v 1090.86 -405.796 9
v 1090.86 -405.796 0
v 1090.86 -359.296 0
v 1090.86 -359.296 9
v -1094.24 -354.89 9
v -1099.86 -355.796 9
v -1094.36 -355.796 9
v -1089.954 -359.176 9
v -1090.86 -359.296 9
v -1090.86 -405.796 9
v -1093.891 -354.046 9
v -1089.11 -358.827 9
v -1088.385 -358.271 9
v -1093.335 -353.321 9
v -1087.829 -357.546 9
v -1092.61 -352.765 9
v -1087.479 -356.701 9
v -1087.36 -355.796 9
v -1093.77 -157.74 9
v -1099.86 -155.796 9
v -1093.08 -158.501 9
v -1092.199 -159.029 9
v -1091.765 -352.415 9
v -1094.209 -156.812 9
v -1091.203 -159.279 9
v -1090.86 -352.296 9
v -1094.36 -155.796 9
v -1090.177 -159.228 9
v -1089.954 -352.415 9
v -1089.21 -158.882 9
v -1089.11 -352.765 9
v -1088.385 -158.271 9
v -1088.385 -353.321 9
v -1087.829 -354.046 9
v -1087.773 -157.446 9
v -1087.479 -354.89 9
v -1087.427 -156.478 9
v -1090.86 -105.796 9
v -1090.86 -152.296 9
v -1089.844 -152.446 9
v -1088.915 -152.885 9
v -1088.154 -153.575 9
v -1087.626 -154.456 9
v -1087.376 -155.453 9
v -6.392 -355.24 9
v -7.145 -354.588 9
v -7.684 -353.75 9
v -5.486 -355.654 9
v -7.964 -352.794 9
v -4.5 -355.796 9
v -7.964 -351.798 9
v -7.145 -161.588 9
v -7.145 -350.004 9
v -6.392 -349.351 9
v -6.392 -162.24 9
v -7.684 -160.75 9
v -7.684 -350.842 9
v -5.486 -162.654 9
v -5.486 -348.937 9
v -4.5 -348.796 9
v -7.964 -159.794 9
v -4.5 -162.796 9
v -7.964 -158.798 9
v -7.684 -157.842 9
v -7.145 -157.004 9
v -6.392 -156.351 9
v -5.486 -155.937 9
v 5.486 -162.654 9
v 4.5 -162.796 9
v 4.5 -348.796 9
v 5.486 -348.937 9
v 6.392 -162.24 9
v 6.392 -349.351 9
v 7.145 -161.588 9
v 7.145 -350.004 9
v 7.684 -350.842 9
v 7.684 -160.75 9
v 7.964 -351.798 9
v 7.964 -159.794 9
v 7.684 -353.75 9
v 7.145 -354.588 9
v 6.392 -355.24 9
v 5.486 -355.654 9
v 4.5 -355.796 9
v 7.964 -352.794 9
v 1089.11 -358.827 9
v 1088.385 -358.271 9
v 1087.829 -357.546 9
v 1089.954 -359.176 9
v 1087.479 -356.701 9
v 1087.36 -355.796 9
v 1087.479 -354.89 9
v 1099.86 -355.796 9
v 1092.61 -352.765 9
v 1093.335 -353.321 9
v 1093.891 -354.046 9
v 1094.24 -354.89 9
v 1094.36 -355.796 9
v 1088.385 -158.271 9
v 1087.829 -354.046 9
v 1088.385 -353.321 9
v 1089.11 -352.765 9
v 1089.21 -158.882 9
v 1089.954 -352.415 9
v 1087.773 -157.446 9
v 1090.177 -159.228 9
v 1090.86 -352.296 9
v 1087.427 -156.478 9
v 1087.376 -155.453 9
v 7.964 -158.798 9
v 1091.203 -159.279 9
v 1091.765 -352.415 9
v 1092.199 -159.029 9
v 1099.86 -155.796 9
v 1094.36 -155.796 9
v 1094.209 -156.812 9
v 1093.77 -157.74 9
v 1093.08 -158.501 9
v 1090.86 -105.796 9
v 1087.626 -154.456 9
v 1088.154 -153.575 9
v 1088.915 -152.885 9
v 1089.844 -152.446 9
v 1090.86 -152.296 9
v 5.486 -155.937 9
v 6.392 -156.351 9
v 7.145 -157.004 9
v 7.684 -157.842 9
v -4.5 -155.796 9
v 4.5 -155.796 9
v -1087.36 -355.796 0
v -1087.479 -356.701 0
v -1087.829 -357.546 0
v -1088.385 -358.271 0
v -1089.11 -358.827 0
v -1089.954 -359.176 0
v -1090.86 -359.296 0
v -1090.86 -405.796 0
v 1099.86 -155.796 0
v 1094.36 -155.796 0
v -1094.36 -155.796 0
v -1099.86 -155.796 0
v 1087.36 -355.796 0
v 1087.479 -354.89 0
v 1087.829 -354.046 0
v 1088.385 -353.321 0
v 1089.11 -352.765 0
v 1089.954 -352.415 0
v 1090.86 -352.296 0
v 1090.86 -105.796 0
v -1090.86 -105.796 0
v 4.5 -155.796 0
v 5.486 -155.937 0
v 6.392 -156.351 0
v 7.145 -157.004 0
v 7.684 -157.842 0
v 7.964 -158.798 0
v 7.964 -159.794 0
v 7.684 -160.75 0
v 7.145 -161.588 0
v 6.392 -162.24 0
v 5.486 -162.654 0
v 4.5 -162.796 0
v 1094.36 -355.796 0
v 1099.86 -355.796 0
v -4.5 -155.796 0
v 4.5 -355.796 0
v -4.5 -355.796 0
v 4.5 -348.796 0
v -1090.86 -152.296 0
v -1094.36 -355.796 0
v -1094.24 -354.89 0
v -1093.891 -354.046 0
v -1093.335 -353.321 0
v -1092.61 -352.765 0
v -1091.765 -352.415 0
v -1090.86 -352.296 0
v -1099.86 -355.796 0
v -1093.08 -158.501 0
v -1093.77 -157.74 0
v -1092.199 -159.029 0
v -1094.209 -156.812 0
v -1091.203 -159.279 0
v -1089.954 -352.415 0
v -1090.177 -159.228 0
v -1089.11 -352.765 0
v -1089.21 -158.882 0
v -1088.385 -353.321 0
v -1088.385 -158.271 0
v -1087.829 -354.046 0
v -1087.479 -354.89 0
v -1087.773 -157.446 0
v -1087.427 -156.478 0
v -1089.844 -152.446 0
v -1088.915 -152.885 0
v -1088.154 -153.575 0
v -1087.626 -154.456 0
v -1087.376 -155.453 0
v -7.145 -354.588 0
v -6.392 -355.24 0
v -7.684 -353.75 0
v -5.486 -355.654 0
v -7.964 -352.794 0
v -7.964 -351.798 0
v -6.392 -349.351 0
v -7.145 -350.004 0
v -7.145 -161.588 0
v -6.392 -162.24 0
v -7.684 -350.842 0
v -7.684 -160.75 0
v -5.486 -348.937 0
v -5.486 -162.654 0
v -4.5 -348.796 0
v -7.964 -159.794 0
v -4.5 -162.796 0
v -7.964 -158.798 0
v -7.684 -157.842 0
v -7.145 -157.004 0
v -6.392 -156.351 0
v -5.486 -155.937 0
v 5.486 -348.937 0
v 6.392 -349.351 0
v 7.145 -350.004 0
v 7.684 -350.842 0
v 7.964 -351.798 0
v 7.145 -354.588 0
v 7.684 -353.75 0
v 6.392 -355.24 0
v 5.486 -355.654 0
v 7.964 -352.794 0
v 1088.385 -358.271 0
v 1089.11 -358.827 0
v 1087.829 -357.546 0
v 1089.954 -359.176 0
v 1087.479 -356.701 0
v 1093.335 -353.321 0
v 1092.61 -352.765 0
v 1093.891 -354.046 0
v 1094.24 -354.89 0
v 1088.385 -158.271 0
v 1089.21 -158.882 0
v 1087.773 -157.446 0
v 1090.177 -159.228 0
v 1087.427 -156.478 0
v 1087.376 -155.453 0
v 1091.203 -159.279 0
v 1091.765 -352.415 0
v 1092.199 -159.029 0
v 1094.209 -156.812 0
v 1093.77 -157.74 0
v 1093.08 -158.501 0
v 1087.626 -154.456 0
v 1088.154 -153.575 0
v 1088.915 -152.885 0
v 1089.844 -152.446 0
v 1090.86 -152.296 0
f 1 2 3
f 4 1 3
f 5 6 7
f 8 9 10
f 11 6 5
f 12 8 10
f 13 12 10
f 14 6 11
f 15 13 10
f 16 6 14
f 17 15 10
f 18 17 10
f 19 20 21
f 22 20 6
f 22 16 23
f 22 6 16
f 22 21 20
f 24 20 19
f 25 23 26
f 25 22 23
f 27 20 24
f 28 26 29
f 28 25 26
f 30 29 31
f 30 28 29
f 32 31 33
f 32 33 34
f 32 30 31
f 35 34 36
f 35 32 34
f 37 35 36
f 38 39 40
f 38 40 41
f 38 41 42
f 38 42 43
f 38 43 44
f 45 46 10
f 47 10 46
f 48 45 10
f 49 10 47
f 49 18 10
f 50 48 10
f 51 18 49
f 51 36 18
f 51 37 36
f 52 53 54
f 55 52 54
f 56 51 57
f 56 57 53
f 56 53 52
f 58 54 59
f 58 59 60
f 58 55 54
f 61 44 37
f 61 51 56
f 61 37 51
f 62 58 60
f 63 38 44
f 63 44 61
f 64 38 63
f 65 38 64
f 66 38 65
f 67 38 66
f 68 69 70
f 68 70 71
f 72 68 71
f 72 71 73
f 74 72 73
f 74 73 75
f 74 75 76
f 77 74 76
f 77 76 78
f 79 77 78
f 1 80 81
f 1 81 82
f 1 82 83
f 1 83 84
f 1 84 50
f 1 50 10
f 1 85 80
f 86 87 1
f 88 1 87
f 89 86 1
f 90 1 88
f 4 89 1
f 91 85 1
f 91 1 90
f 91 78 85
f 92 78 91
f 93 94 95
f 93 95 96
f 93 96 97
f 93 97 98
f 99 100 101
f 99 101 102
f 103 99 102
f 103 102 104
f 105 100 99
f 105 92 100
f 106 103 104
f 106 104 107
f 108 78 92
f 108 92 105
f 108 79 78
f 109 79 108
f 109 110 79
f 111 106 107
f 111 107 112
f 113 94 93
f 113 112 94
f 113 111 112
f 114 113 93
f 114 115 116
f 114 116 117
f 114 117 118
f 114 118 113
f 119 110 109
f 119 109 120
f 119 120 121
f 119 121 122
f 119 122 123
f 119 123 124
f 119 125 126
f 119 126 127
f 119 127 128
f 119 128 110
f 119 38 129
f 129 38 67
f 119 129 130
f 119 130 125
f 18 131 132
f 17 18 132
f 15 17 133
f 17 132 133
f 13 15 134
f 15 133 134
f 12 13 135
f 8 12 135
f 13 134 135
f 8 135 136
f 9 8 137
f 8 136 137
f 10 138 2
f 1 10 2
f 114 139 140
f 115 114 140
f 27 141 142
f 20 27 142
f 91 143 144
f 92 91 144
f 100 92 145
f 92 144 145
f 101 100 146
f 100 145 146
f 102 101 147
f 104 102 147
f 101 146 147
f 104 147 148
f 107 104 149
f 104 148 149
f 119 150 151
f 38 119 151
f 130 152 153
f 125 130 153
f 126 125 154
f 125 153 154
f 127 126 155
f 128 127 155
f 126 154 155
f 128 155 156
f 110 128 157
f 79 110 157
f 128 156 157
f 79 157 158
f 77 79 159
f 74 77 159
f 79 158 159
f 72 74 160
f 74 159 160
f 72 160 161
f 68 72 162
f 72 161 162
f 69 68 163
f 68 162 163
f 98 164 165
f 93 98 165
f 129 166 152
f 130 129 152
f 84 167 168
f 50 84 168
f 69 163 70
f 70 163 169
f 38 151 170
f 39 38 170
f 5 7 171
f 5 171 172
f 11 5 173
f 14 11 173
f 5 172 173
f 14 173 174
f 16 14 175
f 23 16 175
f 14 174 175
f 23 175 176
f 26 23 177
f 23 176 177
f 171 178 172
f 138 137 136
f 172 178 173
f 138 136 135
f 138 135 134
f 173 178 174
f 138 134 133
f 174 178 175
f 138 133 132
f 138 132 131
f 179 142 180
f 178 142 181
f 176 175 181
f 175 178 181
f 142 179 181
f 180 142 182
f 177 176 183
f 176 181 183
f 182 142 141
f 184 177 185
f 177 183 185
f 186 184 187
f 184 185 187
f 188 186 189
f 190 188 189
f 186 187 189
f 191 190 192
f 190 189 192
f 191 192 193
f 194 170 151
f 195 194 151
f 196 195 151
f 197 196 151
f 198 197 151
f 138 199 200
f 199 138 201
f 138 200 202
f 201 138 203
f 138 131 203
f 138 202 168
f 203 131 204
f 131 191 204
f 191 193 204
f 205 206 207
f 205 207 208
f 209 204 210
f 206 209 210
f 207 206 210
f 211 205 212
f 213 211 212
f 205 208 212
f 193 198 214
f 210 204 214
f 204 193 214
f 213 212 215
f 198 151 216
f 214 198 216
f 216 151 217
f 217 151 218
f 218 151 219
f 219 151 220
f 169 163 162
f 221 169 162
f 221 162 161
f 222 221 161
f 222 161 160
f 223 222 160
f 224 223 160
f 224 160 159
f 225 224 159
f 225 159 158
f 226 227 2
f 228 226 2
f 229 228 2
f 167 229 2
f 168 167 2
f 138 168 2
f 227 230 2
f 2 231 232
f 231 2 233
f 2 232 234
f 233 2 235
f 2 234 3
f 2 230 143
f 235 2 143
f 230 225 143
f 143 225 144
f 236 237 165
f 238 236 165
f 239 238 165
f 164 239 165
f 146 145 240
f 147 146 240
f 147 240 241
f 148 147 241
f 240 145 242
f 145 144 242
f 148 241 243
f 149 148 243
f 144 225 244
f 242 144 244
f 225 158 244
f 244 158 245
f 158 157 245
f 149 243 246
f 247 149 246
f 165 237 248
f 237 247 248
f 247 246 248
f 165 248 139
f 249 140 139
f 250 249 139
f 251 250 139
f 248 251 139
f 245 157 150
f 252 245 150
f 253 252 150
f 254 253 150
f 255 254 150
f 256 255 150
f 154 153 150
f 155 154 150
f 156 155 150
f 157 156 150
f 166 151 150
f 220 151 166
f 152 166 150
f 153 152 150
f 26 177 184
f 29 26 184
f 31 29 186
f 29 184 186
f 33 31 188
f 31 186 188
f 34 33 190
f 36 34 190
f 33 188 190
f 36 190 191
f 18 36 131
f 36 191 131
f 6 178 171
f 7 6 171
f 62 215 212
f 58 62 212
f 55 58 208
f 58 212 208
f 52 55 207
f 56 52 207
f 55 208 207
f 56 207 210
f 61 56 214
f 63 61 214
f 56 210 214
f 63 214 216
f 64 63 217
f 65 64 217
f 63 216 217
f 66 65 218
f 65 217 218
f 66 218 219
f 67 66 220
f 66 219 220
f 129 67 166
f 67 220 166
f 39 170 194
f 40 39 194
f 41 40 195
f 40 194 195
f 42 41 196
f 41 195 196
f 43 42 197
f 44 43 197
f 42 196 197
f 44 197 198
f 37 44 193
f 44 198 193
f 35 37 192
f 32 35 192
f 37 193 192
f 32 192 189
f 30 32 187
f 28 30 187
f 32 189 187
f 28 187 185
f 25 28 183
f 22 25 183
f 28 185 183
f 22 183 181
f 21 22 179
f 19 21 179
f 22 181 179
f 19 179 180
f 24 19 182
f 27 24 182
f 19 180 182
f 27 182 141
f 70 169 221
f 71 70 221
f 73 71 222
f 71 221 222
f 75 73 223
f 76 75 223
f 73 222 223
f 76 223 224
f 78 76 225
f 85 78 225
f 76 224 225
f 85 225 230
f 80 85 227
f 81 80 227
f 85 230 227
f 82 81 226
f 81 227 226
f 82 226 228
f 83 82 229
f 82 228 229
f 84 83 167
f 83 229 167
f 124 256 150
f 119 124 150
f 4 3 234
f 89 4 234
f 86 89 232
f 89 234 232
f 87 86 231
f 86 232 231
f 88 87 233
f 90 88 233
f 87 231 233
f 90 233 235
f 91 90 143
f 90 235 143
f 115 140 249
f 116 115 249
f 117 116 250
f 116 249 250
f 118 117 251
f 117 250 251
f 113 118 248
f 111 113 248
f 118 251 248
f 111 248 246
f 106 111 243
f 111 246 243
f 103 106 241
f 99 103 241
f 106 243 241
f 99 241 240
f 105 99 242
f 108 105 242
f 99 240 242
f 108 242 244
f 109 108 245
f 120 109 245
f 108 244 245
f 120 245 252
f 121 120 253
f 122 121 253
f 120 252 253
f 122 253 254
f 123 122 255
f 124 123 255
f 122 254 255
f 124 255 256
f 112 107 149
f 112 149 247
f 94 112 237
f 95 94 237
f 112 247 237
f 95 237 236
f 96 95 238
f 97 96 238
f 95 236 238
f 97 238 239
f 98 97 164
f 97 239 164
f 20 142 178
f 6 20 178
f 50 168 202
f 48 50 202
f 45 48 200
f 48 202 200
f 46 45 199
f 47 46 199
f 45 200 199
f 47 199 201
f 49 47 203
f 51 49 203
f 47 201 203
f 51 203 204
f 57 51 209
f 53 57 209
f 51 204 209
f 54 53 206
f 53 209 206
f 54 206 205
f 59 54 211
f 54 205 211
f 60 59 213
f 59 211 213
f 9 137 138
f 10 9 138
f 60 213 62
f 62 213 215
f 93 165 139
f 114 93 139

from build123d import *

# Parameters (mm, degrees)
F1_DEPTH = 9


with BuildPart() as f1:
    # F0 (on Top) → F1 (new body)
    with BuildSketch(Plane.XY):
        with BuildLine():
            Line((1090.859627, -105.795628), (-1090.859627, -105.795628))
            Line((-1090.859627, -105.795628), (-1090.859627, -152.295628))
            ThreePointArc((-1090.859627, -152.295628), (-1088.384754, -158.270502), (-1094.359627, -155.795628))
            Line((-1094.359627, -155.795628), (-1099.859627, -155.795628))
            Line((-1099.859627, -155.795628), (-1099.859627, -355.795628))
            Line((-1099.859627, -355.795628), (-1094.359627, -355.795628))
            ThreePointArc((-1094.359627, -355.795628), (-1093.334501, -353.320754), (-1090.859627, -352.295628))
            ThreePointArc((-1090.859627, -352.295628), (-1088.384754, -353.320754), (-1087.359627, -355.795628))
            ThreePointArc((-1087.359627, -355.795628), (-1088.384754, -358.270502), (-1090.859627, -359.295628))
            Line((-1090.859627, -359.295628), (-1090.859627, -405.795628))
            Line((-1090.859627, -405.795628), (1090.859627, -405.795628))
            Line((1090.859627, -405.795628), (1090.859627, -359.295628))
            ThreePointArc((1090.859627, -359.295628), (1088.384754, -358.270502), (1087.359627, -355.795628))
            ThreePointArc((1087.359627, -355.795628), (1088.384754, -353.320754), (1090.859627, -352.295628))
            ThreePointArc((1090.859627, -352.295628), (1093.334501, -353.320754), (1094.359627, -355.795628))
            Line((1094.359627, -355.795628), (1099.859627, -355.795628))
            Line((1099.859627, -355.795628), (1099.859627, -155.795628))
            Line((1099.859627, -155.795628), (1094.359627, -155.795628))
            ThreePointArc((1094.359627, -155.795628), (1088.384754, -158.270502), (1090.859627, -152.295628))
            Line((1090.859627, -152.295628), (1090.859627, -105.795628))
        make_face()
        with BuildLine():
            ThreePointArc((4.5, -155.795628), (8, -159.295628), (4.5, -162.795628))
            Line((4.5, -162.795628), (4.5, -255.795628))
            Line((4.5, -255.795628), (4.5, -348.795628))
            ThreePointArc((4.5, -348.795628), (8, -352.295628), (4.5, -355.795628))
            Line((4.5, -355.795628), (0, -355.795628))
            Line((0, -355.795628), (-4.5, -355.795628))
            ThreePointArc((-4.5, -355.795628), (-8, -352.295628), (-4.5, -348.795628))
            Line((-4.5, -348.795628), (-4.5, -255.795628))
            Line((-4.5, -255.795628), (-4.5, -162.795628))
            ThreePointArc((-4.5, -162.795628), (-8, -159.295628), (-4.5, -155.795628))
            Line((-4.5, -155.795628), (0, -155.795628))
            Line((0, -155.795628), (4.5, -155.795628))
        make_face(mode=Mode.SUBTRACT)
    extrude(amount=F1_DEPTH)


solid = f1.part
